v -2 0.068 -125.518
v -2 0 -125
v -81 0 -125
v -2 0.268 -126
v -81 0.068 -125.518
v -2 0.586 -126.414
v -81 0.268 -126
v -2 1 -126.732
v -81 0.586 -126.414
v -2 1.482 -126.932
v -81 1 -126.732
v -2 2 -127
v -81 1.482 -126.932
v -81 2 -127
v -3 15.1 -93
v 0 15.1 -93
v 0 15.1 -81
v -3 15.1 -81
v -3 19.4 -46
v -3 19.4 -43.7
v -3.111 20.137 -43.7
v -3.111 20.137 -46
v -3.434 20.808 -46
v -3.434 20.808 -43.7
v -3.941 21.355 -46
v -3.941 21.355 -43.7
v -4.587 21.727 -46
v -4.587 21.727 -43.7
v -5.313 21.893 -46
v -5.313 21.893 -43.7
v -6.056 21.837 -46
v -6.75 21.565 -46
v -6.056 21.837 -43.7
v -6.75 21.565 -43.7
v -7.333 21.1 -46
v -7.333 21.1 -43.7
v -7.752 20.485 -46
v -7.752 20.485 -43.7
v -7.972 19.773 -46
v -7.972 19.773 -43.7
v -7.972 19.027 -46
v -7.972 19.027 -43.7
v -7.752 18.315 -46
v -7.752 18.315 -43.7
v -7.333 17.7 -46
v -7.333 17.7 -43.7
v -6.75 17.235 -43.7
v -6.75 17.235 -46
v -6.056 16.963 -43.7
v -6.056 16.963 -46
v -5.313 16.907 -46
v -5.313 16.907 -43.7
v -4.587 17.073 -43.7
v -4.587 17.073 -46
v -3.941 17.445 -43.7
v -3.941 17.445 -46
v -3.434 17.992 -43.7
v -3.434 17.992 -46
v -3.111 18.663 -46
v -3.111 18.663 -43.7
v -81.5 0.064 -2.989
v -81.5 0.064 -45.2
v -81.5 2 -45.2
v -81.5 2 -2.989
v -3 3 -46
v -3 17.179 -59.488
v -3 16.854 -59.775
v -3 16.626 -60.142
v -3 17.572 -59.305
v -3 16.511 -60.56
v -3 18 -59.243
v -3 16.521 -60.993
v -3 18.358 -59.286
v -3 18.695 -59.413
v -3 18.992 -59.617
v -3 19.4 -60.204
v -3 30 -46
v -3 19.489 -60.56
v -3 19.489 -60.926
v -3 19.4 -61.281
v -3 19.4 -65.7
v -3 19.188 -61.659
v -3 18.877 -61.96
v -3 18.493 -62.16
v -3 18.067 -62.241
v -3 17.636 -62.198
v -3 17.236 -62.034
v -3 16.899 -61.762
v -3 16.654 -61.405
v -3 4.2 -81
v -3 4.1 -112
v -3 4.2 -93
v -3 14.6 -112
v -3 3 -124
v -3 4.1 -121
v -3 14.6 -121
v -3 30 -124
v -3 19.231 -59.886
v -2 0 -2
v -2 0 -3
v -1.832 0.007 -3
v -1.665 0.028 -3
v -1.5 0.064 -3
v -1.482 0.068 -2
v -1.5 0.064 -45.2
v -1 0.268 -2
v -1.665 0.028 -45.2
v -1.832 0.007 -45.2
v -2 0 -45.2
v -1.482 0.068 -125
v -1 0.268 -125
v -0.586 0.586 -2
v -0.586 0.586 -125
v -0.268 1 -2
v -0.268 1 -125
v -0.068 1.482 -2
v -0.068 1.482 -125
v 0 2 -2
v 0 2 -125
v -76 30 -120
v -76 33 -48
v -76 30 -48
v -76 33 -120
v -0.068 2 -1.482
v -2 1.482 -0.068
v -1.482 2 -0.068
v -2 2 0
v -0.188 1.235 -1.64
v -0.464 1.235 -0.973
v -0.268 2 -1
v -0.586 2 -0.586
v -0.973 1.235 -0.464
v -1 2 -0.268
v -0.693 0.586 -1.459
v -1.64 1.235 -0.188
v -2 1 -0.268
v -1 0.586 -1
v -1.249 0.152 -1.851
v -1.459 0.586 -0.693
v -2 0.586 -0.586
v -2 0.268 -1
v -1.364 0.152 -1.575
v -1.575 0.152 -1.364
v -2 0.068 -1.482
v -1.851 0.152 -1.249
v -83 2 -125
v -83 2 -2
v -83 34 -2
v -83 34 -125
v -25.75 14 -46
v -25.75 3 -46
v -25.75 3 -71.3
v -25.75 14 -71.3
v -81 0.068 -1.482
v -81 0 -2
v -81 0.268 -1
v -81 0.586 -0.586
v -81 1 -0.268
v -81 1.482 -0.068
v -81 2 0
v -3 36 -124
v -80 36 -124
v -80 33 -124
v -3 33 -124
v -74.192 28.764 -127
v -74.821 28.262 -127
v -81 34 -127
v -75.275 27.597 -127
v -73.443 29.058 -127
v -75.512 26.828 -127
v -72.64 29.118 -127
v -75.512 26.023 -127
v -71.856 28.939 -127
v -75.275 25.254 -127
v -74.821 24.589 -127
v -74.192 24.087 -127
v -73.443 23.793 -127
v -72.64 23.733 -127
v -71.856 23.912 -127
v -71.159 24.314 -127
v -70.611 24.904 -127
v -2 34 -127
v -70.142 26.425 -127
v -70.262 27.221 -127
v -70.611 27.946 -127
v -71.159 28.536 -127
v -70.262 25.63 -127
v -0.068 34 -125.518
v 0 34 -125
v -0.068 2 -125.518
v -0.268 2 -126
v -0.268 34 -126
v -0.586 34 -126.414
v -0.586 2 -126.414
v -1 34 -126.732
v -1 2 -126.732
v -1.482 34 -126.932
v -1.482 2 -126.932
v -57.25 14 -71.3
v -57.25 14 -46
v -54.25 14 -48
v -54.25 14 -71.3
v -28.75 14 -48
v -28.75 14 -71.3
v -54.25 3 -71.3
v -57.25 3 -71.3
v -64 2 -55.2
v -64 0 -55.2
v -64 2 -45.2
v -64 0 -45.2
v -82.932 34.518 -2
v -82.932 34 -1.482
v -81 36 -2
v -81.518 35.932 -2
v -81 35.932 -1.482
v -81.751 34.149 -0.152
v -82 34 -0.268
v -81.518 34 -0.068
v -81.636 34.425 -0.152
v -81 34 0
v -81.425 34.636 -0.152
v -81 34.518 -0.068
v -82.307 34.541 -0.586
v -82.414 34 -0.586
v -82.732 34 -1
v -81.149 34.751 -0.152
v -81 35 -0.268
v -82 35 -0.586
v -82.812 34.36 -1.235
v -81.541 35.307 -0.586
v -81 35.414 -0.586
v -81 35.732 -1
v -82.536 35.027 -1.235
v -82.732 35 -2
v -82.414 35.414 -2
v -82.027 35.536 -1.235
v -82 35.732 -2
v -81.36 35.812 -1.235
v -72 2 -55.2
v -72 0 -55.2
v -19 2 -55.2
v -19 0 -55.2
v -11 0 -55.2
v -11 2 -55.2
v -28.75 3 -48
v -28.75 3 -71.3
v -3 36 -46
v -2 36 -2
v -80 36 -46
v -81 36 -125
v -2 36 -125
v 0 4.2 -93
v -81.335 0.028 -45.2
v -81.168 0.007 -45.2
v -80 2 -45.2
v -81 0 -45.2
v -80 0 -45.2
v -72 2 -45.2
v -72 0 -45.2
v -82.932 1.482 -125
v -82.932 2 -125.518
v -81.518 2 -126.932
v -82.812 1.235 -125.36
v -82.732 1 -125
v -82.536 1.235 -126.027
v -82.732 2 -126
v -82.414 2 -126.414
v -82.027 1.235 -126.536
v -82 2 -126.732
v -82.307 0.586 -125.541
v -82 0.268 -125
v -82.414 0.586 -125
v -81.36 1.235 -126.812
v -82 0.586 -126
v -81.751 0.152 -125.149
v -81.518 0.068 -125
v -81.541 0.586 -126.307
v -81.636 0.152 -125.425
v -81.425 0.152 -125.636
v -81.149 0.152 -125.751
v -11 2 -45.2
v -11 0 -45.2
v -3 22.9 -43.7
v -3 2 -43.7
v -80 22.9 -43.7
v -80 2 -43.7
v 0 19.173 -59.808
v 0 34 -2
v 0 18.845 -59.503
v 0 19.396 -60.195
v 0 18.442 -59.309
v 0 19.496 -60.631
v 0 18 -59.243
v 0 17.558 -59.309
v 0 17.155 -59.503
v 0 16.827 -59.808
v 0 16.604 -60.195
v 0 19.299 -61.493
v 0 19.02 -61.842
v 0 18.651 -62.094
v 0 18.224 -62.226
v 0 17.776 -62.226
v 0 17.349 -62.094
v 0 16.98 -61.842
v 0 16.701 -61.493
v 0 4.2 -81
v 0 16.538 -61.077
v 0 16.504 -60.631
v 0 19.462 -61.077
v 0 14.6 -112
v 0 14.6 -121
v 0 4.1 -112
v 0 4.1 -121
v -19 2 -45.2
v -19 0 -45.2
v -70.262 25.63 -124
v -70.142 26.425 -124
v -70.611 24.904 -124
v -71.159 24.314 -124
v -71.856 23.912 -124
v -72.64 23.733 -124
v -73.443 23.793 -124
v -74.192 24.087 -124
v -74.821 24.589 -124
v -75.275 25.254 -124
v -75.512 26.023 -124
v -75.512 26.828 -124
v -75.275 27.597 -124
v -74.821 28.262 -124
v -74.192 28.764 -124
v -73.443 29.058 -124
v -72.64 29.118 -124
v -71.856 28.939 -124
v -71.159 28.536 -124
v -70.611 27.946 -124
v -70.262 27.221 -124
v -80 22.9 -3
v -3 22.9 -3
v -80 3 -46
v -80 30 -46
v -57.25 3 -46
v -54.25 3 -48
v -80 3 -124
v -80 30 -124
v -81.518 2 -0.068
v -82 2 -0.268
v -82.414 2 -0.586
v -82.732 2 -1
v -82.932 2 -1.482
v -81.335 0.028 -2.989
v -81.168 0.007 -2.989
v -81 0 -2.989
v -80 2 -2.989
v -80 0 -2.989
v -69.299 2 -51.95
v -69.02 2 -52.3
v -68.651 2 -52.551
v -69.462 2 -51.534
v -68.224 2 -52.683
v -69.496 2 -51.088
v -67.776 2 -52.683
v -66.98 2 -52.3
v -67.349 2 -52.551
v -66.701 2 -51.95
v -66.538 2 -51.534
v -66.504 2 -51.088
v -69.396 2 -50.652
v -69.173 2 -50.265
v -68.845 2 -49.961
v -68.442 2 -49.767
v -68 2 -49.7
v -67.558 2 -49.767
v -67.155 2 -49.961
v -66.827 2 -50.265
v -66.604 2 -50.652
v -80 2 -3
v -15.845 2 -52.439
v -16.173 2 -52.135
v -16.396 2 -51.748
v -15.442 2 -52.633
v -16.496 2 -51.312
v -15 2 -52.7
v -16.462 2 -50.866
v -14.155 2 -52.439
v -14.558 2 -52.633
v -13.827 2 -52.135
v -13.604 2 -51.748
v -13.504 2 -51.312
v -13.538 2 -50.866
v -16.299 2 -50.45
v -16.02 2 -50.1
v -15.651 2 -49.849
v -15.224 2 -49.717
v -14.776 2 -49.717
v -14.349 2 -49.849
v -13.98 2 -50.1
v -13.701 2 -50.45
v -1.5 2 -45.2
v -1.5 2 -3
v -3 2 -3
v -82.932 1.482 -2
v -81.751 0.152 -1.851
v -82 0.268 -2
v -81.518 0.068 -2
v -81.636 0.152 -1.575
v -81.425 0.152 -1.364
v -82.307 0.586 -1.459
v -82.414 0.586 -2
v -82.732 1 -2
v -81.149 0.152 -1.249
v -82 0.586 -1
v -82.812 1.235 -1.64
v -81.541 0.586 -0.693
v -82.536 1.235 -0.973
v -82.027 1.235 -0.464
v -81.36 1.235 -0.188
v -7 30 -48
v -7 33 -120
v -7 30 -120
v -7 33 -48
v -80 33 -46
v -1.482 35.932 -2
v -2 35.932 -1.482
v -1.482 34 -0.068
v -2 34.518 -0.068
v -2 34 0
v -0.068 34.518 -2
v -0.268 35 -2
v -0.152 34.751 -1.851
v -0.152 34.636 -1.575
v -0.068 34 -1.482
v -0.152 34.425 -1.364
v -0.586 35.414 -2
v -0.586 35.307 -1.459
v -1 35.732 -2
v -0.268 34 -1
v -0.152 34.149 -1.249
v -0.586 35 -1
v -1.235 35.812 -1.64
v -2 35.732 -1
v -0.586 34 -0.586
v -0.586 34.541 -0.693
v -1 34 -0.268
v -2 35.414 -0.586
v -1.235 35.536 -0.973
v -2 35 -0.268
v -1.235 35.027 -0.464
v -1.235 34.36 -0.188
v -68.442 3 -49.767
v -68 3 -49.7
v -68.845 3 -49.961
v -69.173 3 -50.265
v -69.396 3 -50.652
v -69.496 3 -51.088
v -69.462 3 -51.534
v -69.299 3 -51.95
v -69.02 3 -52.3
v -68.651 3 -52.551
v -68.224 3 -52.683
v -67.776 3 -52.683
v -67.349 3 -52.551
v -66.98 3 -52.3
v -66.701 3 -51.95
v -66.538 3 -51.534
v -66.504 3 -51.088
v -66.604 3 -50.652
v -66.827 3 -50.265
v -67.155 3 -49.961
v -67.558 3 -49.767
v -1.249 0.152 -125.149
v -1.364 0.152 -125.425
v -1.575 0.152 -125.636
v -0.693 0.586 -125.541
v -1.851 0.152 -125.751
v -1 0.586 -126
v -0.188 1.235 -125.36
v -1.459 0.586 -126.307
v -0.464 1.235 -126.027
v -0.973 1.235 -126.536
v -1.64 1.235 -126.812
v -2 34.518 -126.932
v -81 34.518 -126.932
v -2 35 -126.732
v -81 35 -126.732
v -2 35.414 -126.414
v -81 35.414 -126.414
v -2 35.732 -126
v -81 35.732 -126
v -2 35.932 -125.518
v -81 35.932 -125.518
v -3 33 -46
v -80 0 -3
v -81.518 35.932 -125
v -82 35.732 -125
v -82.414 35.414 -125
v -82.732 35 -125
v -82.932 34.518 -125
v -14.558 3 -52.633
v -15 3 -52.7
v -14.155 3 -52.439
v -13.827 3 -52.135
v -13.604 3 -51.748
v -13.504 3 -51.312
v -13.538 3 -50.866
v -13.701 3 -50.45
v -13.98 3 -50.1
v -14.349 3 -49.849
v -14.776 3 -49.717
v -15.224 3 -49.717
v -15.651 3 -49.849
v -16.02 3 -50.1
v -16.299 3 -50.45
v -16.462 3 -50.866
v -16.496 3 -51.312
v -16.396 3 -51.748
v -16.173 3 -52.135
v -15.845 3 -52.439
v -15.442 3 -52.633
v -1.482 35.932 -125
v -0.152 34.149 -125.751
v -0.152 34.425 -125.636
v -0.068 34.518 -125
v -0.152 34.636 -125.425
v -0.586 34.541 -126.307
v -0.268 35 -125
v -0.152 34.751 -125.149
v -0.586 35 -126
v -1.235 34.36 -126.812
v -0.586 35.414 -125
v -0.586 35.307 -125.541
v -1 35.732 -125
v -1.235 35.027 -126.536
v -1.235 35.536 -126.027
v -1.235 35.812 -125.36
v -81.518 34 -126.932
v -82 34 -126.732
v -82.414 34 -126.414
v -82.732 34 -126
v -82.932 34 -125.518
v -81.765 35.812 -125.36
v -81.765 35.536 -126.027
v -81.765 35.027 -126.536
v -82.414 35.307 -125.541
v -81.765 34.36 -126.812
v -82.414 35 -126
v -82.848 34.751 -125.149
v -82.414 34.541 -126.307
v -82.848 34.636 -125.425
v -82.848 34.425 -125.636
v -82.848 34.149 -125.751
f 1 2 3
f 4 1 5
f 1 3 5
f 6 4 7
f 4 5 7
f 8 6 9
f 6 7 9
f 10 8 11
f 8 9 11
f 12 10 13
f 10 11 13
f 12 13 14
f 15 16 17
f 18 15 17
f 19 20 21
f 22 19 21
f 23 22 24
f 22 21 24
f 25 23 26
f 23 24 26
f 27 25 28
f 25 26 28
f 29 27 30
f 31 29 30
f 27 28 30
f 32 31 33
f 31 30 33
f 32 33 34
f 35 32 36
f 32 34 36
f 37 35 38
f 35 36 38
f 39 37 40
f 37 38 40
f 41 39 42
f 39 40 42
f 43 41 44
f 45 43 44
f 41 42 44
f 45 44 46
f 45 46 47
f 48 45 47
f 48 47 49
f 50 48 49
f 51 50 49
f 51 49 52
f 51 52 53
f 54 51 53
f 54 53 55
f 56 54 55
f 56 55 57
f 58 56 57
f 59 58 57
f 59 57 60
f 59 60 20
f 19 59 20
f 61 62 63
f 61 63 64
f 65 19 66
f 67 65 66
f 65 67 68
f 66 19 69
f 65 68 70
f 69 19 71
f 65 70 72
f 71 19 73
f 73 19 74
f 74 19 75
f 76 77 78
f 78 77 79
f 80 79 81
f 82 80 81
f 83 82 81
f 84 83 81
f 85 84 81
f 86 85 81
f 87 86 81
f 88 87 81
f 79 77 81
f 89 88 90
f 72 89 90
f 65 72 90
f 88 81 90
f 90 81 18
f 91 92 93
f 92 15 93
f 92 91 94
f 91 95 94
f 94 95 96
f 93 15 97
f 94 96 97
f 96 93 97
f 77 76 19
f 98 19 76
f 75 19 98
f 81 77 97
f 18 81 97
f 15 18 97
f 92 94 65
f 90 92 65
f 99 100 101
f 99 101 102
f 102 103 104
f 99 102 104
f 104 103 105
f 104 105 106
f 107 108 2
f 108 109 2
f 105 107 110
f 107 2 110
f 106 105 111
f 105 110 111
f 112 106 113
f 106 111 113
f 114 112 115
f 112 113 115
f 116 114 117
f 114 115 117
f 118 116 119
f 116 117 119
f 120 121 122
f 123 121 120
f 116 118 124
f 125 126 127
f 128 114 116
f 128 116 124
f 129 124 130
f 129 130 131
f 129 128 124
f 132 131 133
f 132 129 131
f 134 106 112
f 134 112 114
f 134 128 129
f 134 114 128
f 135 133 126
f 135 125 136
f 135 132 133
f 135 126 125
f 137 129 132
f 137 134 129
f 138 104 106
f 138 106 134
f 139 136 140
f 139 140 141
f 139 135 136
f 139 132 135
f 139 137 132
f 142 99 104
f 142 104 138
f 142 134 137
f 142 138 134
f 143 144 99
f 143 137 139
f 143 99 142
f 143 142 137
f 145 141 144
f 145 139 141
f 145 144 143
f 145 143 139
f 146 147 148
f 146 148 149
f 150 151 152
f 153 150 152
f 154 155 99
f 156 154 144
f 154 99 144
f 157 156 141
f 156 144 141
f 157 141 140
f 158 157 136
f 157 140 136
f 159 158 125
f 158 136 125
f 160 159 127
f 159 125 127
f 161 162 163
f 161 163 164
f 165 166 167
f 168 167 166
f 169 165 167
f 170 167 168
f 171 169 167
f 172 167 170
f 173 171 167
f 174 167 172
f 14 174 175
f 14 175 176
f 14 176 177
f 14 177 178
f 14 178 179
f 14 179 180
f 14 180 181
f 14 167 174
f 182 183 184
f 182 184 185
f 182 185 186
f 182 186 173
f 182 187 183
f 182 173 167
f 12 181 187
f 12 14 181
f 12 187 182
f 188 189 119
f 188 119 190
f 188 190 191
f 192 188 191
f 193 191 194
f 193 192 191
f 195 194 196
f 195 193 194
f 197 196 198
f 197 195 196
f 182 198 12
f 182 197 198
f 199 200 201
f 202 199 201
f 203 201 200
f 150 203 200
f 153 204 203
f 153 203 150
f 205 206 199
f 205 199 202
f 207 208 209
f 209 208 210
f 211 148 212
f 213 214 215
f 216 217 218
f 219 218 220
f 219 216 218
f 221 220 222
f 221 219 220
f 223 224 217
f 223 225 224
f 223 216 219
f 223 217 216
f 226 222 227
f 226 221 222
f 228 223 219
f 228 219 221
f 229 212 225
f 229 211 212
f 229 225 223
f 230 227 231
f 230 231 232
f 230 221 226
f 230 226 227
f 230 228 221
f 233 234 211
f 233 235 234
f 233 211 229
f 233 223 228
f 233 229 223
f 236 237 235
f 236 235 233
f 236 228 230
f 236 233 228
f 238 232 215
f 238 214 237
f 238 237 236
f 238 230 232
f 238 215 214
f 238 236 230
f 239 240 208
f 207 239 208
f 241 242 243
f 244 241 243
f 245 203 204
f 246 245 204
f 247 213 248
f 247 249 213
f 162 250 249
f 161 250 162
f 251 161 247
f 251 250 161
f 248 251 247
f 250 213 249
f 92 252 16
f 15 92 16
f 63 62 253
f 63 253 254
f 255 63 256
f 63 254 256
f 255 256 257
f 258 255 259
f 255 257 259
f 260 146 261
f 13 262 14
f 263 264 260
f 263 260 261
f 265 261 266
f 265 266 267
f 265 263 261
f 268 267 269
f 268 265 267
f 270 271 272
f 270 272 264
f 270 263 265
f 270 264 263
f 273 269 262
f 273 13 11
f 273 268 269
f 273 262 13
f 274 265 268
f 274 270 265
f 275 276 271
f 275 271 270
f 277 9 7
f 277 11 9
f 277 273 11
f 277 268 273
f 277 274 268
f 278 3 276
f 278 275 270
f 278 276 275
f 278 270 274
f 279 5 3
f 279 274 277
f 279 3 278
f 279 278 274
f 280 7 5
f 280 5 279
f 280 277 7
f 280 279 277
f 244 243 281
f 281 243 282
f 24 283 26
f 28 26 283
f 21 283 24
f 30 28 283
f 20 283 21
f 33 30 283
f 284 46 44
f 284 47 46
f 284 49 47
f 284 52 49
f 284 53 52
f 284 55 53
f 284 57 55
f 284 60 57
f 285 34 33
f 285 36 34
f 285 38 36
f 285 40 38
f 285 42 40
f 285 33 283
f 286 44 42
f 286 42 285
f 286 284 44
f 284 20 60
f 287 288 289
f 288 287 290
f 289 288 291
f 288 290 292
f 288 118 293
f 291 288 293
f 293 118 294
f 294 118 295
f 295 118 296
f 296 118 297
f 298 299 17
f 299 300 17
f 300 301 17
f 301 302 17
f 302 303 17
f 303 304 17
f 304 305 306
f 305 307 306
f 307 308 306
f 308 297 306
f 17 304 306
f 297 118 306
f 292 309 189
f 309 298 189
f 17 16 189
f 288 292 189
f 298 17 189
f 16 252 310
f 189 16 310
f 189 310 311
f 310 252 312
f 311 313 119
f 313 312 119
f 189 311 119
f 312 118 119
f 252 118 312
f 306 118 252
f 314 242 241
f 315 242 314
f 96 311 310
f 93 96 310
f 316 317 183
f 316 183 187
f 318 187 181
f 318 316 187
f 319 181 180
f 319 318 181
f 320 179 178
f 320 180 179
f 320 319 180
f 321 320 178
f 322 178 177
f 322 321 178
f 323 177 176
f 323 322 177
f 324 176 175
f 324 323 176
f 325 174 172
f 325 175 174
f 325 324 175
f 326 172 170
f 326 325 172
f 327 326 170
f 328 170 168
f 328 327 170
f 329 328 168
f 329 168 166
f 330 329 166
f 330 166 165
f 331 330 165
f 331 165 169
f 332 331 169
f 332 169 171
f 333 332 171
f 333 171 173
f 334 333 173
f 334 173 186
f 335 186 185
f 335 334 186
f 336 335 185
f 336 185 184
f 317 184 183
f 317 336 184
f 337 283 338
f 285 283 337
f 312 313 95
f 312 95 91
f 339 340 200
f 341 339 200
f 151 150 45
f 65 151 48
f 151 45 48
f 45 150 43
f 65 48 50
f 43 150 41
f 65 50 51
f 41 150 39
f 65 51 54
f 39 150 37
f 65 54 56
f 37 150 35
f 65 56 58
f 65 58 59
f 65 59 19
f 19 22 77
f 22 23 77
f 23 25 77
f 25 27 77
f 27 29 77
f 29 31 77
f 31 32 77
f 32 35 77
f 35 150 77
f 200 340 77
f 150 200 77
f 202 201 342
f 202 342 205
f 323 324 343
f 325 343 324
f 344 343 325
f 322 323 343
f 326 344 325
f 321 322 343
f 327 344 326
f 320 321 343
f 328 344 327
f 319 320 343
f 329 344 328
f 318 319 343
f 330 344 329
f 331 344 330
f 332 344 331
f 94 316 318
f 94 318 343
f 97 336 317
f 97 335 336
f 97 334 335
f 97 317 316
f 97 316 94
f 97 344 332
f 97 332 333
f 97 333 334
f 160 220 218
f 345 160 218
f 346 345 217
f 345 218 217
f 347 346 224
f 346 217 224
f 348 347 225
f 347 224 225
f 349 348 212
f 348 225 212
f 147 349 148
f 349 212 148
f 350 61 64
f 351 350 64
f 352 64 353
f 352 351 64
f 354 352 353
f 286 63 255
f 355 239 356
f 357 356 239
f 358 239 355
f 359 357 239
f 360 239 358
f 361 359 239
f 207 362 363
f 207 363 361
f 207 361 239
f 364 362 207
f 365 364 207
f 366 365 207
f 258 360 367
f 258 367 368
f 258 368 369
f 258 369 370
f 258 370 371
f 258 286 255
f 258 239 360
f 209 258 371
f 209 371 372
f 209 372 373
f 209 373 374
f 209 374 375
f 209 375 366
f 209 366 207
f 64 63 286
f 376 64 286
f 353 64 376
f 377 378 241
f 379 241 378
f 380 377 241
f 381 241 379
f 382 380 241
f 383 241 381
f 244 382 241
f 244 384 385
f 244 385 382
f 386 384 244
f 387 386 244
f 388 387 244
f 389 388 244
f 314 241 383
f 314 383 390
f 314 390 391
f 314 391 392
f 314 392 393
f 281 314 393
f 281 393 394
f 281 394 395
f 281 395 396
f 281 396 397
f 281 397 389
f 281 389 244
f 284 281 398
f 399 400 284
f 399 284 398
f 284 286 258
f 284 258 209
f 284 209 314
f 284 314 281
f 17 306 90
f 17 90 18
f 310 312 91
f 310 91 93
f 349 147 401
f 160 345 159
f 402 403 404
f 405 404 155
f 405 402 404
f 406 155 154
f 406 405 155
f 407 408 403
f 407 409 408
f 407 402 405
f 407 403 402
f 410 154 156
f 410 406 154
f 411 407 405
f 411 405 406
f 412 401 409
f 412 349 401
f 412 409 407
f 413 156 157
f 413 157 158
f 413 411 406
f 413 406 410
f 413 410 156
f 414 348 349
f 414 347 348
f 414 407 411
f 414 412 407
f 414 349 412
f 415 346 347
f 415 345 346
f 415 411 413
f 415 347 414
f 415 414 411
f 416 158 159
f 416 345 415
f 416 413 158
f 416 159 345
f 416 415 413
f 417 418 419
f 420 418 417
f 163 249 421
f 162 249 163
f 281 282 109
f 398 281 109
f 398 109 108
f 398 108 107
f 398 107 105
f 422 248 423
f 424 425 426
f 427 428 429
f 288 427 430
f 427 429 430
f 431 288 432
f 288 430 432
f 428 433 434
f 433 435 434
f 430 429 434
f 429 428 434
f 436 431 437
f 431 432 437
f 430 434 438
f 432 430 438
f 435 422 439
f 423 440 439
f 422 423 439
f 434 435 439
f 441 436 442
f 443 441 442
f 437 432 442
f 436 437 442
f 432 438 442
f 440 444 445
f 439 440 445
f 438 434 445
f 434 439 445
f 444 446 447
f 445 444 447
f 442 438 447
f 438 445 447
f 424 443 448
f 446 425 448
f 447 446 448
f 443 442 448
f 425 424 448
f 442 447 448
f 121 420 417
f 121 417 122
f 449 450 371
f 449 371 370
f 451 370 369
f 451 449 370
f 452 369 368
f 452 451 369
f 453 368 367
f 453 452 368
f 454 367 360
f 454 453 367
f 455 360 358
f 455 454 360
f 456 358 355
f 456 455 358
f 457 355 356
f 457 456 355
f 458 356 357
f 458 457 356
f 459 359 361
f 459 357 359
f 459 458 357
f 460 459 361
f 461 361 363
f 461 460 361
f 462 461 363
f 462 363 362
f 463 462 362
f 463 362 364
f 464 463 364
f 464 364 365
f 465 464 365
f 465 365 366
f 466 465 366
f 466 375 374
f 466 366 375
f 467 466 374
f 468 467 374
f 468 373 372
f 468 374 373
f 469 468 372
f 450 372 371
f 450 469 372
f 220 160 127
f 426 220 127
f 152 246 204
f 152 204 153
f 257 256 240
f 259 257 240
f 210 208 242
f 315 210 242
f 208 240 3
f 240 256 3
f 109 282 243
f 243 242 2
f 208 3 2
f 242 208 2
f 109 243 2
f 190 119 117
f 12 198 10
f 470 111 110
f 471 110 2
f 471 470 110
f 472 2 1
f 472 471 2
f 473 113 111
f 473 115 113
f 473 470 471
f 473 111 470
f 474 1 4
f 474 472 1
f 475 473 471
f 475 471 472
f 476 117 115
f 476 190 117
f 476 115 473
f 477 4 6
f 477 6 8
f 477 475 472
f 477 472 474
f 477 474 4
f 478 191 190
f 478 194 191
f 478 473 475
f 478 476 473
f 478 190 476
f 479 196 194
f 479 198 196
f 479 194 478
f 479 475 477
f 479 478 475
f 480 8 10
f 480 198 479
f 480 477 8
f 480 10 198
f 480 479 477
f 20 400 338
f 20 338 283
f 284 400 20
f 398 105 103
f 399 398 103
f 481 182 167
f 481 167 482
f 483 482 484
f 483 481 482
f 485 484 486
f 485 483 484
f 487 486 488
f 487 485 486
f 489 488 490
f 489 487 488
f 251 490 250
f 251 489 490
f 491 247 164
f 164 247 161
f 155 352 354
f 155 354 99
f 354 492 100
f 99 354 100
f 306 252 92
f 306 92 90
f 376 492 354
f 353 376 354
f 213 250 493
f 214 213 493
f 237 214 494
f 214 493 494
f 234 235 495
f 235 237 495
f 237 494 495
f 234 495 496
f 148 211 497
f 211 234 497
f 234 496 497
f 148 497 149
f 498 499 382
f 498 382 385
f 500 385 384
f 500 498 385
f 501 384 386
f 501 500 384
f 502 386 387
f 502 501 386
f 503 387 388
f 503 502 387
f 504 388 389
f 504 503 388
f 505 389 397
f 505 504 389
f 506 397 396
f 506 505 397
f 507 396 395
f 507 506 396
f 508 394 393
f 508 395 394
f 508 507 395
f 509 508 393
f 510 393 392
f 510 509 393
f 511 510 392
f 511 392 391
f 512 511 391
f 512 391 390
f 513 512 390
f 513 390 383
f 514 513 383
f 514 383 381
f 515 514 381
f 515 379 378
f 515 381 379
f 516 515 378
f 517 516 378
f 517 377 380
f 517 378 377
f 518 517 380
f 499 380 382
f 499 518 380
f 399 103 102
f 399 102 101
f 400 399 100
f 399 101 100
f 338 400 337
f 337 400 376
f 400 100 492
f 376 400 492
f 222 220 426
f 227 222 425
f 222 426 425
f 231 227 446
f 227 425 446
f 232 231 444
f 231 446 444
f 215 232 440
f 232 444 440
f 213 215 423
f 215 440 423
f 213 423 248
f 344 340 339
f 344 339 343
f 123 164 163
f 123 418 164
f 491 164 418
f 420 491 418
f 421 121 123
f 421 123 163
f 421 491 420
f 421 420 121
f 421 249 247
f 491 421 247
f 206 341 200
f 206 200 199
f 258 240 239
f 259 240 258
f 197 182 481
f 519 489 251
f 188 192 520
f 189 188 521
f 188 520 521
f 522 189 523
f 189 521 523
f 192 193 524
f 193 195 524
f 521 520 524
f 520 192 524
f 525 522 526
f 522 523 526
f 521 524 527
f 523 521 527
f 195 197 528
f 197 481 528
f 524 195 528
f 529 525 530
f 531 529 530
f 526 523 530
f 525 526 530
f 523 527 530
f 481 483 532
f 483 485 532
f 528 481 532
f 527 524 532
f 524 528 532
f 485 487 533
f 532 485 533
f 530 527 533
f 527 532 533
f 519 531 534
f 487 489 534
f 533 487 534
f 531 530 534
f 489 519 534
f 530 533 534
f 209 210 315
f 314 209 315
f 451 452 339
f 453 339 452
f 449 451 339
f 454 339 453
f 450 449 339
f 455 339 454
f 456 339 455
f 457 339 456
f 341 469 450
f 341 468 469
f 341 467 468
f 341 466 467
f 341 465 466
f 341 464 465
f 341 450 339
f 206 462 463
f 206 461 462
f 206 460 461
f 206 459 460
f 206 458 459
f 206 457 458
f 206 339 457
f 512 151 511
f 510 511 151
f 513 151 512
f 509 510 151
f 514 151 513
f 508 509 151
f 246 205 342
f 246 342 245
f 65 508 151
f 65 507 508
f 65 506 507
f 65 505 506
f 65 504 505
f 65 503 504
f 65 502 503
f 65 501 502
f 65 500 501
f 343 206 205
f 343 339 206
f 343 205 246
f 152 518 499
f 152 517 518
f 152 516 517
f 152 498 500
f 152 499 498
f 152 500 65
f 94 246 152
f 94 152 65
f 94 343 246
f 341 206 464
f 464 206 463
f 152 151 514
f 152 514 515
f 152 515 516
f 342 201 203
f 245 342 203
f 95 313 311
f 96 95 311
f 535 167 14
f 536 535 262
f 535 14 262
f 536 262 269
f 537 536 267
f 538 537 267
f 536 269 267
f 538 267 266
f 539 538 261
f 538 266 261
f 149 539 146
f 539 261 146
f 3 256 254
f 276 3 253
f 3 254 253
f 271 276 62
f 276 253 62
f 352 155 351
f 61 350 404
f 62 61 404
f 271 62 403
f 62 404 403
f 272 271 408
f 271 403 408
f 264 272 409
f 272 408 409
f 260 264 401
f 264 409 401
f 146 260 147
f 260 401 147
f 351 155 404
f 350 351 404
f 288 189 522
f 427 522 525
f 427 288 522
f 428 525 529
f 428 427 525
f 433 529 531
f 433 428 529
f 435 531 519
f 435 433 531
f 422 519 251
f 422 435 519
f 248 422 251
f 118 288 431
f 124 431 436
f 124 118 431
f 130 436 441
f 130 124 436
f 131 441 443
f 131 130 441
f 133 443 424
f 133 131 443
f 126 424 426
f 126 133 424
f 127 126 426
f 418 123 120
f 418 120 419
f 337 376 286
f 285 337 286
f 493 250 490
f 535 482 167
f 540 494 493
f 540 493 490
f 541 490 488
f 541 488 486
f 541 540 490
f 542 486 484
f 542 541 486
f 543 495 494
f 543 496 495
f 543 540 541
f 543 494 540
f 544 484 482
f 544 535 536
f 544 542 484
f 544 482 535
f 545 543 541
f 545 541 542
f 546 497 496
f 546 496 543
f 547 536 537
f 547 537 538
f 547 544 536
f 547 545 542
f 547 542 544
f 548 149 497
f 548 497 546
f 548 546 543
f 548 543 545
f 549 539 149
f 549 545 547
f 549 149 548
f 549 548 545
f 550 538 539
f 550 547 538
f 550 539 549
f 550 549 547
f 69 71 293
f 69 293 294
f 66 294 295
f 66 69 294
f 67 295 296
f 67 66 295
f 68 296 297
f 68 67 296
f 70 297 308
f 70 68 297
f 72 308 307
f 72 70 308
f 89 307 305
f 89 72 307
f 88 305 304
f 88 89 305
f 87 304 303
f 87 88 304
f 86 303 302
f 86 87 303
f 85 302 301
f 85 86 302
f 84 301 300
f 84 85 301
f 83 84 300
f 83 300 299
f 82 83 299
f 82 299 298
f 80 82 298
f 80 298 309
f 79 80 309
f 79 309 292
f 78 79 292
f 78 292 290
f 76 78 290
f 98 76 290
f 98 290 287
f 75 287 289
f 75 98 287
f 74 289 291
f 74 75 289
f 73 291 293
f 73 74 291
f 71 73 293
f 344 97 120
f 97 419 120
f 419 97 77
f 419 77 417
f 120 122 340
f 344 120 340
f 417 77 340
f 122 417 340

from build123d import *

# Parameters (mm, degrees)
SKETCH_1_W                = 83
SKETCH_1_H                = 127
EXTRUDE_1_DEPTH           = 36
SKETCH_2_W                = 77
SKETCH_2_H                = 40.7
CUT_EXTRUDE_1_DEPTH       = 22.9
SKETCH_3_W                = 77
SKETCH_3_H                = 78
CUT_EXTRUDE_4_DEPTH       = 33
SKETCH_4_W                = 31.5
SKETCH_4_H                = 25.3
EXTRUDE_2_DEPTH           = 11
SKETCH_5_W                = 25.5
SKETCH_5_H                = 23.3
CUT_EXTRUDE_5_DEPTH       = 11
CUT_EXTRUDE_6_DEPTH       = 14
CUT_EXTRUDE_6_DEPTH_BACK  = 10
SKETCH_6_R                = 1.5
SKETCH_7_R                = 2.5
CUT_EXTRUDE_7_DEPTH       = 22
CUT_EXTRUDE_8_DEPTH       = 23
CUT_EXTRUDE_8_DEPTH_BACK  = 30
SKETCH_8_R                = 2.7
CUT_EXTRUDE_9_DEPTH       = 11
CUT_EXTRUDE_9_DEPTH_BACK  = 33
SKETCH_9_W                = 12
SKETCH_9_H                = 10.9
CUT_EXTRUDE_10_DEPTH      = 14
CUT_EXTRUDE_10_DEPTH_BACK = 36
SKETCH_10_W               = 9
SKETCH_10_H               = 10.5
SKETCH_11_W               = 78
SKETCH_11_H               = 3
EXTRUDE_3_DEPTH           = 4
SKETCH_12_W               = 69
SKETCH_12_H               = 3
EXTRUDE_4_DEPTH           = 4
SKETCH_13_W               = 78
SKETCH_13_H               = 3
EXTRUDE_5_DEPTH           = 4
SKETCH_15_W               = 69
SKETCH_15_H               = 3
EXTRUDE_6_DEPTH           = 2
SKETCH_16_W               = 1.5
SKETCH_16_H               = 41.5
CUT_EXTRUDE_11_DEPTH      = 2
SKETCH_17_W               = 78.5
SKETCH_17_H               = 1.5
CUT_EXTRUDE_12_DEPTH      = 2
SKETCH_19_W               = 1.5
SKETCH_19_H               = 42.211102857
CUT_EXTRUDE_13_DEPTH      = 2
FILLET_1_R                = 2
FILLET_2_R                = 2
FILLET_3_R                = 2
FILLET_4_R                = 2
FILLET_5_R                = 2
SKETCH_20_W               = 8
SKETCH_20_H               = 10
CUT_EXTRUDE_14_DEPTH      = 2
SKETCH_21_W               = 8
SKETCH_21_H               = 10
CUT_EXTRUDE_15_DEPTH      = 2
CUT_EXTRUDE_16_DEPTH      = 102
CUT_EXTRUDE_16_DEPTH_BACK = 85
SKETCH_22_R               = 1.5
CUT_EXTRUDE_17_DEPTH      = 37
CUT_EXTRUDE_17_DEPTH_BACK = 68
SKETCH_23_R               = 1.5


with BuildPart() as part:
    # Эскиз1 → Бобышка-Вытянуть1 (new body)
    with BuildSketch(Plane(origin=(0, 0, 0), x_dir=(1, 0, 0), z_dir=(0, 1, 0))):
        with Locations((-41.5, 63.5)):
            Rectangle(SKETCH_1_W, SKETCH_1_H)
    extrude(amount=EXTRUDE_1_DEPTH)

    # Эскиз2 → Вырез-Вытянуть1 (cut)
    with BuildSketch(Plane(origin=(0, 0, 0), x_dir=(-1, 0, 0), z_dir=(0, -1, 0))):
        with Locations((41.5, 23.35)):
            Rectangle(SKETCH_2_W, SKETCH_2_H)
    extrude(amount=-CUT_EXTRUDE_1_DEPTH, mode=Mode.SUBTRACT)

    # Эскиз3 → Вырез-Вытянуть4 (cut)
    with BuildSketch(Plane(origin=(0, 36, 0), x_dir=(1, 0, 0), z_dir=(0, 1, 0))):
        with Locations((-41.5, 85)):
            Rectangle(SKETCH_3_W, SKETCH_3_H)
    extrude(amount=-CUT_EXTRUDE_4_DEPTH, mode=Mode.SUBTRACT)

    # Эскиз4 → Бобышка-Вытянуть2 (add)
    with BuildSketch(Plane(origin=(0, 3, 0), x_dir=(1, 0, 0), z_dir=(0, 1, 0))):
        with Locations((-41.5, 58.65)):
            Rectangle(SKETCH_4_W, SKETCH_4_H)
    extrude(amount=EXTRUDE_2_DEPTH)

    # Эскиз5 → Вырез-Вытянуть5 (cut)
    with BuildSketch(Plane(origin=(0, 14, 0), x_dir=(1, 0, 0), z_dir=(0, 1, 0))):
        with Locations((-41.5, 59.65)):
            Rectangle(SKETCH_5_W, SKETCH_5_H)
    extrude(amount=-CUT_EXTRUDE_5_DEPTH, mode=Mode.SUBTRACT)

    # Эскиз6 → Вырез-Вытянуть6 (cut, two sides: drawn at the far end of the back side and taken through both)
    with BuildSketch(Plane(origin=(0, 0, 0), x_dir=(0, 0, -1), z_dir=(1, 0, 0)).offset(-CUT_EXTRUDE_6_DEPTH_BACK)):
        with Locations(Location((60.742856383, 18, 0), (0, 0, 180))):
            Circle(SKETCH_6_R)
    extrude(amount=CUT_EXTRUDE_6_DEPTH + CUT_EXTRUDE_6_DEPTH_BACK, mode=Mode.SUBTRACT)

    # Эскиз7 → Вырез-Вытянуть7 (cut)
    with BuildSketch(Plane.XY.offset(-43.7)):
        with Locations((-5.5, 19.4)):
            Circle(SKETCH_7_R)
    extrude(amount=-CUT_EXTRUDE_7_DEPTH, mode=Mode.SUBTRACT)

    # Эскиз8 → Вырез-Вытянуть8 (cut, two sides: drawn at the far end of the back side and taken through both)
    with BuildSketch(Plane(origin=(0, 0, -127), x_dir=(-1, 0, 0), z_dir=(0, 0, -1)).offset(-CUT_EXTRUDE_8_DEPTH_BACK)):
        with Locations(Location((72.842031124, 26.425424665, 0), (0, 0, 180))):
            Circle(SKETCH_8_R)
    extrude(amount=CUT_EXTRUDE_8_DEPTH + CUT_EXTRUDE_8_DEPTH_BACK, mode=Mode.SUBTRACT)

    # Эскиз9 → Вырез-Вытянуть9 (cut, two sides: drawn at the far end of the back side and taken through both)
    with BuildSketch(Plane.ZY.offset(3).offset(-CUT_EXTRUDE_9_DEPTH_BACK)):
        with Locations((-87, 9.65)):
            Rectangle(SKETCH_9_W, SKETCH_9_H)
    extrude(amount=CUT_EXTRUDE_9_DEPTH + CUT_EXTRUDE_9_DEPTH_BACK, mode=Mode.SUBTRACT)

    # Эскиз10 → Вырез-Вытянуть10 (cut, two sides: drawn at the far end of the back side and taken through both)
    with BuildSketch(Plane.ZY.offset(3).offset(-CUT_EXTRUDE_10_DEPTH_BACK)):
        with Locations((-116.5, 9.35)):
            Rectangle(SKETCH_10_W, SKETCH_10_H)
    extrude(amount=CUT_EXTRUDE_10_DEPTH + CUT_EXTRUDE_10_DEPTH_BACK, mode=Mode.SUBTRACT)

    # Эскиз11 → Бобышка-Вытянуть3 (add)
    with BuildSketch(Plane.ZY.offset(3)):
        with Locations((-85, 31.5)):
            Rectangle(SKETCH_11_W, SKETCH_11_H)
    extrude(amount=EXTRUDE_3_DEPTH)

    # Эскиз12 → Бобышка-Вытянуть4 (add)
    with BuildSketch(Plane.XY.offset(-124)):
        with Locations((-41.5, 31.5)):
            Rectangle(SKETCH_12_W, SKETCH_12_H)
    extrude(amount=EXTRUDE_4_DEPTH)

    # Эскиз13 → Бобышка-Вытянуть5 (add)
    with BuildSketch(Plane(origin=(-80, 0, 0), x_dir=(0, 0, -1), z_dir=(1, 0, 0))):
        with Locations((85, 31.5)):
            Rectangle(SKETCH_13_W, SKETCH_13_H)
    extrude(amount=EXTRUDE_5_DEPTH)

    # Эскиз15 → Бобышка-Вытянуть6 (add)
    with BuildSketch(Plane(origin=(0, 0, -46), x_dir=(-1, 0, 0), z_dir=(0, 0, -1))):
        with Locations((41.5, 31.5)):
            Rectangle(SKETCH_15_W, SKETCH_15_H)
    extrude(amount=EXTRUDE_6_DEPTH)

    # Эскиз16 → Вырез-Вытянуть11 (cut)
    with BuildSketch(Plane(origin=(0, 0, 0), x_dir=(-1, 0, 0), z_dir=(0, -1, 0))):
        with Locations((2.25, 23.75)):
            Rectangle(SKETCH_16_W, SKETCH_16_H)
    extrude(amount=-CUT_EXTRUDE_11_DEPTH, mode=Mode.SUBTRACT)

    # Эскиз17 → Вырез-Вытянуть12 (cut)
    with BuildSketch(Plane.XZ):
        with Locations((-40.75, -44.45)):
            Rectangle(SKETCH_17_W, SKETCH_17_H)
    extrude(amount=-CUT_EXTRUDE_12_DEPTH, mode=Mode.SUBTRACT)

    # Эскиз19 → Вырез-Вытянуть13 (cut)
    with BuildSketch(Plane.XZ):
        with Locations((-80.75, -24.094448572)):
            Rectangle(SKETCH_19_W, SKETCH_19_H)
    extrude(amount=-CUT_EXTRUDE_13_DEPTH, mode=Mode.SUBTRACT)

    # Скругление1
    fillet_1_edges = [part.edges().sort_by_distance(p)[0] for p in [
        (-41.5, 36, -127),
    ]]
    fillet(fillet_1_edges, radius=FILLET_1_R)

    # Скругление2
    fillet_2_edges = [part.edges().sort_by_distance(p)[0] for p in [
        (-83, 36, -62.5),
        (-83, 17, -127),
        (-83, 35.414213562, -126.414213562),
    ]]
    fillet(fillet_2_edges, radius=FILLET_2_R)

    # Скругление3
    fillet_3_edges = [part.edges().sort_by_distance(p)[0] for p in [
        (-83, 17, 0),
        (-40.5, 36, 0),
        (-82.414213562, 35.414213562, 0),
    ]]
    fillet(fillet_3_edges, radius=FILLET_3_R)

    # Скругление4
    fillet_4_edges = [part.edges().sort_by_distance(p)[0] for p in [
        (0, 17, -127),
        (0, 35.414213562, -126.414213562),
        (0, 17, 0),
        (0, 36, -63.5),
        (0, 35.414213562, -0.585786438),
    ]]
    fillet(fillet_4_edges, radius=FILLET_4_R)

    # Скругление5
    # the kernel refuses this fillet: 2 mm, written as the material it takes off along each edge
    with BuildSketch(Plane(origin=(-2, 0, -125), x_dir=(1, 0, 0), z_dir=(0, 0, 1))) as fillet_5_piece_1:
        with BuildLine():
            CenterArc((2 - FILLET_5_R, FILLET_5_R), FILLET_5_R, 270, 90)
            Line((2, FILLET_5_R), (2, 0))
            Line((2, 0), (2 - FILLET_5_R, 0))
        make_face()
    revolve(axis=Axis((-2, 0, -125), (0, 1, 0)), revolution_arc=90, mode=Mode.SUBTRACT)
    with BuildSketch(Plane(origin=(0, 0, -125), x_dir=(0, 1, 0), z_dir=(0, 0, 1))) as fillet_5_piece_2:
        with BuildLine():
            CenterArc((FILLET_5_R, FILLET_5_R), FILLET_5_R, 180, 90)
            Line((0, FILLET_5_R), (0, 0))
            Line((0, 0), (FILLET_5_R, 0))
        make_face()
    extrude(amount=123, mode=Mode.SUBTRACT)
    with BuildSketch(Plane(origin=(-2, 0, -2), x_dir=(1, 0, 0), z_dir=(0, 0, -1))) as fillet_5_piece_3:
        with BuildLine():
            CenterArc((2 - FILLET_5_R, -FILLET_5_R), FILLET_5_R, 0, 90)
            Line((2, -FILLET_5_R), (2, 0))
            Line((2, 0), (2 - FILLET_5_R, 0))
        make_face()
    revolve(axis=Axis((-2, 0, -2), (0, -1, 0)), revolution_arc=90, mode=Mode.SUBTRACT)
    with BuildSketch(Plane(origin=(-2, 0, 0), x_dir=(0, 0, -1), z_dir=(-1, 0, 0)), Plane(origin=(-81, 0, -127), x_dir=(0, 0, 1), z_dir=(1, 0, 0))) as fillet_5_piece_4:
        with BuildLine():
            CenterArc((FILLET_5_R, -FILLET_5_R), FILLET_5_R, 90, 90)
            Line((0, -FILLET_5_R), (0, 0))
            Line((0, 0), (FILLET_5_R, 0))
        make_face()
    extrude(amount=79, mode=Mode.SUBTRACT)
    with BuildSketch(Plane(origin=(-81, 0, -2), x_dir=(-1, 0, 0), z_dir=(0, 0, -1))) as fillet_5_piece_5:
        with BuildLine():
            CenterArc((2 - FILLET_5_R, FILLET_5_R), FILLET_5_R, 270, 90)
            Line((2, FILLET_5_R), (2, 0))
            Line((2, 0), (2 - FILLET_5_R, 0))
        make_face()
    revolve(axis=Axis((-81, 0, -2), (0, 1, 0)), revolution_arc=90, mode=Mode.SUBTRACT)
    with BuildSketch(Plane(origin=(-83, 0, -2), x_dir=(1, 0, 0), z_dir=(0, 0, -1))) as fillet_5_piece_6:
        with BuildLine():
            CenterArc((FILLET_5_R, -FILLET_5_R), FILLET_5_R, 90, 90)
            Line((0, -FILLET_5_R), (0, 0))
            Line((0, 0), (FILLET_5_R, 0))
        make_face()
    extrude(amount=123, mode=Mode.SUBTRACT)
    with BuildSketch(Plane(origin=(-81, 0, -125), x_dir=(-1, 0, 0), z_dir=(0, 0, 1))) as fillet_5_piece_7:
        with BuildLine():
            CenterArc((2 - FILLET_5_R, -FILLET_5_R), FILLET_5_R, 0, 90)
            Line((2, -FILLET_5_R), (2, 0))
            Line((2, 0), (2 - FILLET_5_R, 0))
        make_face()
    revolve(axis=Axis((-81, 0, -125), (0, -1, 0)), revolution_arc=90, mode=Mode.SUBTRACT)

    # Эскиз20 → Вырез-Вытянуть14 (cut)
    with BuildSketch(Plane.XZ):
        with Locations((-15, -50.2)):
            Rectangle(SKETCH_20_W, SKETCH_20_H)
    extrude(amount=-CUT_EXTRUDE_14_DEPTH, mode=Mode.SUBTRACT)

    # Эскиз21 → Вырез-Вытянуть15 (cut)
    with BuildSketch(Plane.XZ):
        with Locations((-68, -50.2)):
            Rectangle(SKETCH_21_W, SKETCH_21_H)
    extrude(amount=-CUT_EXTRUDE_15_DEPTH, mode=Mode.SUBTRACT)

    # Эскиз22 → Вырез-Вытянуть16 (cut, two sides: drawn at the far end of the back side and taken through both)
    with BuildSketch(Plane.XZ.offset(-2).offset(-CUT_EXTRUDE_16_DEPTH_BACK)):
        with Locations(Location((-15, -51.2, 0), (0, 0, 270))):
            Circle(SKETCH_22_R)
    extrude(amount=CUT_EXTRUDE_16_DEPTH + CUT_EXTRUDE_16_DEPTH_BACK, mode=Mode.SUBTRACT)

    # Эскиз23 → Вырез-Вытянуть17 (cut, two sides: drawn at the far end of the back side and taken through both)
    with BuildSketch(Plane.XZ.offset(-2).offset(-CUT_EXTRUDE_17_DEPTH_BACK)):
        with Locations(Location((-68, -51.2, 0), (0, 0, 90))):
            Circle(SKETCH_23_R)
    extrude(amount=CUT_EXTRUDE_17_DEPTH + CUT_EXTRUDE_17_DEPTH_BACK, mode=Mode.SUBTRACT)


solid = part.part
